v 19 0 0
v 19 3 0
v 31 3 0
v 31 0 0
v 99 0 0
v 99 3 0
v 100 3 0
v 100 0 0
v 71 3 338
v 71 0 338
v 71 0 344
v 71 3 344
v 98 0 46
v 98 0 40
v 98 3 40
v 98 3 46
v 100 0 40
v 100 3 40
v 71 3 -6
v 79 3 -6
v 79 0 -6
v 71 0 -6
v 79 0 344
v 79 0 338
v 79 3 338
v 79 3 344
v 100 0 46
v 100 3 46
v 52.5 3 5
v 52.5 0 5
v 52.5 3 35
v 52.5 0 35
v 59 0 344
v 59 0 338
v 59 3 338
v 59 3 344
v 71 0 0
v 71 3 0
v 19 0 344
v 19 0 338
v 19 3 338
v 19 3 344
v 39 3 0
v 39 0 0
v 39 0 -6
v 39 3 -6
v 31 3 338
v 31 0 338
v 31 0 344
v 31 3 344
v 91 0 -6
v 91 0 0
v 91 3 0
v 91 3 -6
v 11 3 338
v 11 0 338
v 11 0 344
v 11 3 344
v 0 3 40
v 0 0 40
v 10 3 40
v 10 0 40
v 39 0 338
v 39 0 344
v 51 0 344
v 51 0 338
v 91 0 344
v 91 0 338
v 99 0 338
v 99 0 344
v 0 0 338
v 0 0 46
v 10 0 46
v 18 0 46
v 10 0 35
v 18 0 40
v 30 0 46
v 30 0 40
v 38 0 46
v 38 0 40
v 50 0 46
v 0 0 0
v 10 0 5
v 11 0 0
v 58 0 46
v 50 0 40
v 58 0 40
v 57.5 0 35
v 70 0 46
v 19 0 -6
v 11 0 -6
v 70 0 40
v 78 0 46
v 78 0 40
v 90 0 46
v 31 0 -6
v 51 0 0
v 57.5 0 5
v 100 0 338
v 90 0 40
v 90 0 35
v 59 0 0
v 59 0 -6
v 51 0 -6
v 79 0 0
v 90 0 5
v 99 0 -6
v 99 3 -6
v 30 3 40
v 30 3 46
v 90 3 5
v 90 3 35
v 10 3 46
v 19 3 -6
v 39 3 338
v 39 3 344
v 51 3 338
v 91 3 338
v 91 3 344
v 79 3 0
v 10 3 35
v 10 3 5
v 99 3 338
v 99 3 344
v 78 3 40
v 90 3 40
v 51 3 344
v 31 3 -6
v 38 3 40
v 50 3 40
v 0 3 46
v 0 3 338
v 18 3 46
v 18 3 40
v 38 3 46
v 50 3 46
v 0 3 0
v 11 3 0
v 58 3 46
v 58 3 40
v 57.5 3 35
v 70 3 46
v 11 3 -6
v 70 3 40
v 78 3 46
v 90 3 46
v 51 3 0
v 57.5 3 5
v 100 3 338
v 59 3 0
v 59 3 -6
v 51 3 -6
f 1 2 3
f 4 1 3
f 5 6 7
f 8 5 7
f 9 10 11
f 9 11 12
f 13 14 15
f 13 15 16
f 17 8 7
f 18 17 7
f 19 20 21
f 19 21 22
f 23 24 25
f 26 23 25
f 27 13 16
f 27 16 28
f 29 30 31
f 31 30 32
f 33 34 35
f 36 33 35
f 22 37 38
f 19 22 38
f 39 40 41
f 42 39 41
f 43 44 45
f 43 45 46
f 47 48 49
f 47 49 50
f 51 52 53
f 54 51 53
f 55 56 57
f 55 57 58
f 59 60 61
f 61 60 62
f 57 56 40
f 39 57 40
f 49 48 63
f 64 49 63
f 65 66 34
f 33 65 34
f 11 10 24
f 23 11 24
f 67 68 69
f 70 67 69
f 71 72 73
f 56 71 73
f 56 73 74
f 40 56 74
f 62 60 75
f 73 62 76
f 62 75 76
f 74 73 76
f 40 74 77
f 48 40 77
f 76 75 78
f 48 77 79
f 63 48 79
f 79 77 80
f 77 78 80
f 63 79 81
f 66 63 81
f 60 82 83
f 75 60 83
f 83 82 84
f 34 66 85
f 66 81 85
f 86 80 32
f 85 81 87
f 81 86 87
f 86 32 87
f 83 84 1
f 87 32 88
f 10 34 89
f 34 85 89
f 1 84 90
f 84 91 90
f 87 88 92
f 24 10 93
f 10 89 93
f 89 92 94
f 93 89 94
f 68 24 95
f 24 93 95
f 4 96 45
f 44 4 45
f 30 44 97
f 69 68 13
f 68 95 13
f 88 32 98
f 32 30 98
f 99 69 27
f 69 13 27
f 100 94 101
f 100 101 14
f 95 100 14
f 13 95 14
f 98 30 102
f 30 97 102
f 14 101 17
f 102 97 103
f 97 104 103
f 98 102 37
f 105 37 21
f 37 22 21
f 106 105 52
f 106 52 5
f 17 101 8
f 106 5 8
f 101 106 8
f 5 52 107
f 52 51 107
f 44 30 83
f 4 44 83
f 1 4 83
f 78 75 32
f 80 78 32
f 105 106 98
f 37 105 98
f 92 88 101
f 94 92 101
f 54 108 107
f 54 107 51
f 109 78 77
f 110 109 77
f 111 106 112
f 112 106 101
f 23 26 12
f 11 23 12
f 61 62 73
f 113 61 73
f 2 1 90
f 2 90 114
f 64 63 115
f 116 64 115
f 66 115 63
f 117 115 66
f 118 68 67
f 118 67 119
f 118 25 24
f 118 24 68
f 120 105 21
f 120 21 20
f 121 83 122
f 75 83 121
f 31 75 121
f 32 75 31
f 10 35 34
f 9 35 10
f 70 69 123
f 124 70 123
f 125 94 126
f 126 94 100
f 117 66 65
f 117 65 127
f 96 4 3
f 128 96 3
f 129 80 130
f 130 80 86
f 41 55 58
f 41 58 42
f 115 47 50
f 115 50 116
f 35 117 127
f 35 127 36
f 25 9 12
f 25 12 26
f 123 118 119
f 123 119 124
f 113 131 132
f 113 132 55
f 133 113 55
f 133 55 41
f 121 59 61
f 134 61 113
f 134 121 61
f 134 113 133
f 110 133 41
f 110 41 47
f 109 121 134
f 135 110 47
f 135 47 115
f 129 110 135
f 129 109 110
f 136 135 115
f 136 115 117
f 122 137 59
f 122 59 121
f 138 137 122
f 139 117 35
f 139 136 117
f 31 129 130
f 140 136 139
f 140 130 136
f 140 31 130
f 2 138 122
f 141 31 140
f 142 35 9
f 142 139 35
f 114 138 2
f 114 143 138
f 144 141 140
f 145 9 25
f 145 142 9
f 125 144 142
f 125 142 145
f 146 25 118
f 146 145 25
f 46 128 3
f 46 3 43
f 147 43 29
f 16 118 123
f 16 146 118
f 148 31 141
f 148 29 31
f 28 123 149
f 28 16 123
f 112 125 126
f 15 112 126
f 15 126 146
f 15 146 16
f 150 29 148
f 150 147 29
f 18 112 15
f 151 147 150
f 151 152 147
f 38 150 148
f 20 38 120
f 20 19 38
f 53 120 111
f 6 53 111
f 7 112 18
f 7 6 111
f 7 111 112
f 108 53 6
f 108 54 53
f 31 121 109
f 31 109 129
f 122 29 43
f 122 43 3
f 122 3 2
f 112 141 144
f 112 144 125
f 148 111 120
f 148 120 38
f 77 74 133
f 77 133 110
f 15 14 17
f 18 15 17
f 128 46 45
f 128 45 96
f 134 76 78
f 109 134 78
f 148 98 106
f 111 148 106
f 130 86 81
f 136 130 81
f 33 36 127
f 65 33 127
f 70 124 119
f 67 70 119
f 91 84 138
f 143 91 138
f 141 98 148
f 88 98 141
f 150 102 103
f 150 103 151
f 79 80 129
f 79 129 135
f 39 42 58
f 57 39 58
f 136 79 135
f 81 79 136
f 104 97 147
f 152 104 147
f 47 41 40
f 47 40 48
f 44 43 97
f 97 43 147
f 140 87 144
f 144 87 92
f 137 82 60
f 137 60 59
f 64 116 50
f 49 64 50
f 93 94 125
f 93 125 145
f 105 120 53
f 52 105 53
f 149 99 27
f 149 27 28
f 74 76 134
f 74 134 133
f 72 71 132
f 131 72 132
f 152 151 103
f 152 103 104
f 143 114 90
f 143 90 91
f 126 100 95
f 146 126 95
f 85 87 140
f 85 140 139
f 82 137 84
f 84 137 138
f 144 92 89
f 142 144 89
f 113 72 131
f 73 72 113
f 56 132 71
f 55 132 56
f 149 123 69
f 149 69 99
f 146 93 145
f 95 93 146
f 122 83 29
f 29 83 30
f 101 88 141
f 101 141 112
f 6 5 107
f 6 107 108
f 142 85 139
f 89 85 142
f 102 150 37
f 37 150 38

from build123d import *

# Parameters (mm, degrees)
ESQUISSE1_W             = 100
ESQUISSE1_H             = 3
BOSS_EXTRU_1_DEPTH      = 338
ESQUISSE2_W             = 12
ESQUISSE2_H             = 6
ESQUISSE2_W_2           = 2
ESQUISSE2_W_3           = 10
ENL_V_MAT_EXTRU_1_DEPTH = 6
ESQUISSE3_W             = 8
ESQUISSE3_H             = 3
BOSS_EXTRU_2_DEPTH      = 6
ESQUISSE4_W             = 42.5
ESQUISSE4_H             = 30
ESQUISSE4_W_2           = 32.5
ENL_V_MAT_EXTRU_2_DEPTH = 10


with BuildPart() as part:
    # Esquisse1 → Boss.-Extru.1 (new body)
    with BuildSketch(Plane.XY):
        with Locations((50, 1.5)):
            Rectangle(ESQUISSE1_W, ESQUISSE1_H)
    extrude(amount=BOSS_EXTRU_1_DEPTH)

    # Esquisse2 → Enlèv. mat.-Extru.1 (cut)
    with BuildSketch(Plane.XZ):
        with Locations((44, 43)):
            Rectangle(ESQUISSE2_W, ESQUISSE2_H)
        with Locations((24, 43)):
            Rectangle(ESQUISSE2_W, ESQUISSE2_H)
        with Locations((64, 43)):
            Rectangle(ESQUISSE2_W, ESQUISSE2_H)
        with Locations((84, 43)):
            Rectangle(ESQUISSE2_W, ESQUISSE2_H)
        with Locations((99, 43)):
            Rectangle(ESQUISSE2_W_2, ESQUISSE2_H)
        with Locations((5, 43)):
            Rectangle(ESQUISSE2_W_3, ESQUISSE2_H)
    extrude(amount=-ENL_V_MAT_EXTRU_1_DEPTH, mode=Mode.SUBTRACT)

    # Esquisse3 → Boss.-Extru.2 (add)
    with BuildSketch(Plane(origin=(0, 0, 0), x_dir=(-1, 0, 0), z_dir=(0, 0, -1))):
        with Locations((-15, 1.5)):
            Rectangle(ESQUISSE3_W, ESQUISSE3_H)
        with Locations((-35, 1.5)):
            Rectangle(ESQUISSE3_W, ESQUISSE3_H)
        with Locations((-55, 1.5)):
            Rectangle(ESQUISSE3_W, ESQUISSE3_H)
        with Locations((-75, 1.5)):
            Rectangle(ESQUISSE3_W, ESQUISSE3_H)
        with Locations((-95, 1.5)):
            Rectangle(ESQUISSE3_W, ESQUISSE3_H)
    boss_extru_2 = extrude(amount=BOSS_EXTRU_2_DEPTH)

    # Symétrie1: Boss.-Extru.2 across plane
    add(boss_extru_2.mirror(Plane(origin=(0, 0, 169), x_dir=(1, 0, 0), z_dir=(0, 0, -1))))

    # Esquisse4 → Enlèv. mat.-Extru.2 (cut)
    with BuildSketch(Plane.XZ):
        with Locations((31.25, 20)):
            Rectangle(ESQUISSE4_W, ESQUISSE4_H)
        with Locations((73.75, 20)):
            Rectangle(ESQUISSE4_W_2, ESQUISSE4_H)
    extrude(amount=-ENL_V_MAT_EXTRU_2_DEPTH, mode=Mode.SUBTRACT)


solid = part.part
